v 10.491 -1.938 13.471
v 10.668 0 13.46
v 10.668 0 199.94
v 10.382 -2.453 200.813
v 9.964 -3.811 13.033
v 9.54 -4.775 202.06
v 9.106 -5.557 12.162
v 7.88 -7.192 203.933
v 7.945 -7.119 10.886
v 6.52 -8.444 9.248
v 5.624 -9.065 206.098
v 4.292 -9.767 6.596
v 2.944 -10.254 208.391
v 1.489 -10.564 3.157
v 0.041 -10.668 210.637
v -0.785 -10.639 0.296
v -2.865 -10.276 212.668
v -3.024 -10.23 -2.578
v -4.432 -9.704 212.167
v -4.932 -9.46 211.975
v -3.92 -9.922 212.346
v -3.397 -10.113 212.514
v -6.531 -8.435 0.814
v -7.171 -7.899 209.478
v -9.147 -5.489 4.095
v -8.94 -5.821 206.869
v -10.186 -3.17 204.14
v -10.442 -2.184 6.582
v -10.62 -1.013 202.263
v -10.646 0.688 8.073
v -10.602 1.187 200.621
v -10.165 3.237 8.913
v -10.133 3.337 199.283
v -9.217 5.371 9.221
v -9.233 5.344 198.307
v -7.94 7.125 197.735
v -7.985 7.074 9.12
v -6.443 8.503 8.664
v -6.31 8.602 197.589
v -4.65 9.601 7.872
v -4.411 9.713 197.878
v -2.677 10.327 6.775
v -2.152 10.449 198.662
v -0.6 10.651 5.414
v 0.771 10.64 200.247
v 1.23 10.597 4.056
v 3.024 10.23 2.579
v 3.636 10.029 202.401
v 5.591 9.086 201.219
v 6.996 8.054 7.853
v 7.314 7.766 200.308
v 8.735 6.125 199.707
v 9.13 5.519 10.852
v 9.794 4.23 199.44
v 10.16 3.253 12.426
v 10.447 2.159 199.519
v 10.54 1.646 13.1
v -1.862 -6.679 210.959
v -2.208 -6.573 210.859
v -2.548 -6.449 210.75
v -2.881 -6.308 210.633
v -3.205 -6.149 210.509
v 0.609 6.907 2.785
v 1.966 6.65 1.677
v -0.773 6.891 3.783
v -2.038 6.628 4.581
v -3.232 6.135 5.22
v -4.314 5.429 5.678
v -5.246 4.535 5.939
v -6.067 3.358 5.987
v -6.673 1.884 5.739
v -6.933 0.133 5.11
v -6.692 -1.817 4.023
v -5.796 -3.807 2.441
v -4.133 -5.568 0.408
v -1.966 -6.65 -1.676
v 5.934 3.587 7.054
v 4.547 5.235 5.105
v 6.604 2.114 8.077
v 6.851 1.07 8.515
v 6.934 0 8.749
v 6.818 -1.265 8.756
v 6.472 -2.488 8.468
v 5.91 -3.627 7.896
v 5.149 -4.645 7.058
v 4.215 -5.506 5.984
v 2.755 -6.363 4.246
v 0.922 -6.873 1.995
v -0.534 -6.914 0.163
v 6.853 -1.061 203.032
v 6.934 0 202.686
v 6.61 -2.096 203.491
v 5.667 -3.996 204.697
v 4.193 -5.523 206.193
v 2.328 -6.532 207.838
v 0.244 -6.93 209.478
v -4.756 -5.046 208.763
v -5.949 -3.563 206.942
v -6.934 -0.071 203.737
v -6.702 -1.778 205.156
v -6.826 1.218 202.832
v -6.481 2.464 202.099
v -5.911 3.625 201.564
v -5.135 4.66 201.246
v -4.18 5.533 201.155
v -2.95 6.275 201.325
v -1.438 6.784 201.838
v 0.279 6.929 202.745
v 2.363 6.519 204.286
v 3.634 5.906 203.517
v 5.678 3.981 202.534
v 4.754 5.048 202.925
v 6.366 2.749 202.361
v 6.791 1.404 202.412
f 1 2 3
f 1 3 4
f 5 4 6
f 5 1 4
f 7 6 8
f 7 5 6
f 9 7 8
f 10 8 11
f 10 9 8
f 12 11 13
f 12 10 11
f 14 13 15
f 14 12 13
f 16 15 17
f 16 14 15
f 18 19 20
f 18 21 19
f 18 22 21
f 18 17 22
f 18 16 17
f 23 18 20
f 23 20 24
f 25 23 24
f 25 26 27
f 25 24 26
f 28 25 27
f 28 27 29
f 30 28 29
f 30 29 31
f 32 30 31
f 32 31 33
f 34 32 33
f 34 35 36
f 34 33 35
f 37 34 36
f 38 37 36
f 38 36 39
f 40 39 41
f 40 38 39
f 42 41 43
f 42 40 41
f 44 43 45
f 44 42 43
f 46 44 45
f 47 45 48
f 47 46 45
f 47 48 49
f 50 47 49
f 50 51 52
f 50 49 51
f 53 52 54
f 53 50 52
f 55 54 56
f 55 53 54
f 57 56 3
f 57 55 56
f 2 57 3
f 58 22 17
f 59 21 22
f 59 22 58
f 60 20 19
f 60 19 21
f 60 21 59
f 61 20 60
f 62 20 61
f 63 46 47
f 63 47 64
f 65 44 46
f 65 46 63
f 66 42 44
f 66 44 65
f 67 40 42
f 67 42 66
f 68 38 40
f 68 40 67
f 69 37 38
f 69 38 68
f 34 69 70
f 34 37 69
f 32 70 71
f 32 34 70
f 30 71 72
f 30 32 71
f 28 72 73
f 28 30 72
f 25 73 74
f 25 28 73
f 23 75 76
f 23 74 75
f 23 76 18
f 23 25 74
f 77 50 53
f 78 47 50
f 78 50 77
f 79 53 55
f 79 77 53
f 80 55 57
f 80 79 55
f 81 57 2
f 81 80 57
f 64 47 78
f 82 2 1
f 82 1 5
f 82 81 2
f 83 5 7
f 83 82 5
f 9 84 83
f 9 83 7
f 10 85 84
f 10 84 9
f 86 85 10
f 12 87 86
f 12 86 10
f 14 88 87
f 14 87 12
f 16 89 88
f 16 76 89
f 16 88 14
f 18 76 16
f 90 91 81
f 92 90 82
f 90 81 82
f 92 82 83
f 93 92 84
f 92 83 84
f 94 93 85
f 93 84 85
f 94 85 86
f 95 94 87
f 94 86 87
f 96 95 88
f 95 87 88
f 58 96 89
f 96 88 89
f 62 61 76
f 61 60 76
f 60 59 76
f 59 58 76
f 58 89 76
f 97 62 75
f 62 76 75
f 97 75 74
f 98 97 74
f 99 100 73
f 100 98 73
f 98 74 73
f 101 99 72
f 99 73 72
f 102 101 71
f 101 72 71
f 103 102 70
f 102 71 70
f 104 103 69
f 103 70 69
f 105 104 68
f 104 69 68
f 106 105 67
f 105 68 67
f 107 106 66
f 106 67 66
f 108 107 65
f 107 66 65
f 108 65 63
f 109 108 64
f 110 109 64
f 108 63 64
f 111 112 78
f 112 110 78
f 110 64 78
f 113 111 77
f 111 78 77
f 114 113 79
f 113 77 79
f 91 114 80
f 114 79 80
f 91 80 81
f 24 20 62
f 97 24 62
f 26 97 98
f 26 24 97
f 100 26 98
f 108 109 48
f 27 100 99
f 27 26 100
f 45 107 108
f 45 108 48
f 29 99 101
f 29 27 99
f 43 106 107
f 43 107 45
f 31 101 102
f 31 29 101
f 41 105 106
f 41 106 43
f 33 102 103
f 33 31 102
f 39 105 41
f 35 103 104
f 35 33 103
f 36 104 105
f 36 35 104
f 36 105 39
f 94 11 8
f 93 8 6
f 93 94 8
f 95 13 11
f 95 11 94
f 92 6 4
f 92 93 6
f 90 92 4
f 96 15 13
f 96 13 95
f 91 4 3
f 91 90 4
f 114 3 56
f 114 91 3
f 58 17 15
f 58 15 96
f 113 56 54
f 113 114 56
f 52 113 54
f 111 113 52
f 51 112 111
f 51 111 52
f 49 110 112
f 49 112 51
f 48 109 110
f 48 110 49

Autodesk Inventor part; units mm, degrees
ref_plane "Start Plane" through (0, 0, -2.5789) normal (0, 0, 1) x (1, 0, 0)
ref_plane "End Plane" through (0, 0, 212.6682) normal (0, 0, 1) x (1, 0, 0)
sketch "Sketch" plane through (0, 0, 0) normal (0, 0, 1) x (1, 0, 0)
  circle A0 centre (0, 0) radius 6.9342
  circle A1 centre (0, 0) radius 10.668
  dimension "d0" = 21.336
  dimension "d1" = 3.7338
extrude "Body" add sketch "Sketch" along normal up to surface (215.2472 mm away) from surface at -2.5789
sketch "Sketch3" plane through (0, 0, 0) normal (0, 0, 1) x (1, 0, 0)
  line L0 (0, 0) -> (10, 0)
ref_plane "Work Plane3" through (0, 0, 0) normal (0, -1, 0) x (1, 0, 0)
sketch "Sketch4" plane through (0, 0, 0) normal (0, -1, 0) x (1, 0, 0)
  line L0 (-2, -2.5789) -> (12, -2.5789)
  line L1 (-2, 212.6682) -> (12, 212.6682)
  dimension "d7" = 215.2472
ref_plane "Work Plane4" through (-10.6194, 1.0174, -13.521) normal (0.7815, -0.0749, -0.6194) x (-0.6047, 0.1537, -0.7815)
split "Split1" plane through (-10.6194, 1.0174, -13.521) removes the side toward (0.7815, -0.0749, -0.6194)
ref_plane "Work Plane5" through (8.9776, -5.7627, -9.228) normal (-0.5506, 0.3534, -0.7563) x (-0.2438, 0.7984, 0.5506)
split "Split2" plane through (8.9776, -5.7627, -9.228) removes the side toward (-0.5506, 0.3534, -0.7563)
ref_plane "Work Plane6" through (6.6005, -8.3809, 217.9879) normal (-0.4276, 0.543, 0.7227) x (0.8938, 0.1348, 0.4276)
split "Split3" plane through (6.6005, -8.3809, 217.9879) removes the side toward (-0.4276, 0.543, 0.7227)
ref_plane "Work Plane7" through (2.6801, -10.3259, 213.4307) normal (-0.1175, 0.4527, 0.8839) x (0.9927, 0.0282, 0.1175)
split "Split4" plane through (2.6801, -10.3259, 213.4307) removes the side toward (-0.1175, 0.4527, 0.8839)
ref_plane "Work Plane8" through (-10.0134, -3.6794, 216.1428) normal (0.5789, 0.2127, 0.7872) x (0.8125, -0.0689, -0.5789)
split "Split5" plane through (-10.0134, -3.6794, 216.1428) removes the side toward (0.5789, 0.2127, 0.7872)
equation "\"d0\" = G_H"
equation "\"d1\" = G_T"
equation "\"d2\" = G_L"
equation "\"G_H\" = 21.336"
equation "\"G_T\" = 3.7338"
equation "\"G_L\" = 215.24716"
equation "\"G_OFFSET_START\" = 2.57893"
equation "\"G_OFFSET_END\" = 4.88279"
equation "\"d4\" = -G_OFFSET_START"
equation "\"d5\" = G_OFFSET_END + B_L"
equation "\"B_L\" = 207.78544"
properties part number "ANSI - 1/2 x 0.147 - 8.474" material "Steel, Mild"
